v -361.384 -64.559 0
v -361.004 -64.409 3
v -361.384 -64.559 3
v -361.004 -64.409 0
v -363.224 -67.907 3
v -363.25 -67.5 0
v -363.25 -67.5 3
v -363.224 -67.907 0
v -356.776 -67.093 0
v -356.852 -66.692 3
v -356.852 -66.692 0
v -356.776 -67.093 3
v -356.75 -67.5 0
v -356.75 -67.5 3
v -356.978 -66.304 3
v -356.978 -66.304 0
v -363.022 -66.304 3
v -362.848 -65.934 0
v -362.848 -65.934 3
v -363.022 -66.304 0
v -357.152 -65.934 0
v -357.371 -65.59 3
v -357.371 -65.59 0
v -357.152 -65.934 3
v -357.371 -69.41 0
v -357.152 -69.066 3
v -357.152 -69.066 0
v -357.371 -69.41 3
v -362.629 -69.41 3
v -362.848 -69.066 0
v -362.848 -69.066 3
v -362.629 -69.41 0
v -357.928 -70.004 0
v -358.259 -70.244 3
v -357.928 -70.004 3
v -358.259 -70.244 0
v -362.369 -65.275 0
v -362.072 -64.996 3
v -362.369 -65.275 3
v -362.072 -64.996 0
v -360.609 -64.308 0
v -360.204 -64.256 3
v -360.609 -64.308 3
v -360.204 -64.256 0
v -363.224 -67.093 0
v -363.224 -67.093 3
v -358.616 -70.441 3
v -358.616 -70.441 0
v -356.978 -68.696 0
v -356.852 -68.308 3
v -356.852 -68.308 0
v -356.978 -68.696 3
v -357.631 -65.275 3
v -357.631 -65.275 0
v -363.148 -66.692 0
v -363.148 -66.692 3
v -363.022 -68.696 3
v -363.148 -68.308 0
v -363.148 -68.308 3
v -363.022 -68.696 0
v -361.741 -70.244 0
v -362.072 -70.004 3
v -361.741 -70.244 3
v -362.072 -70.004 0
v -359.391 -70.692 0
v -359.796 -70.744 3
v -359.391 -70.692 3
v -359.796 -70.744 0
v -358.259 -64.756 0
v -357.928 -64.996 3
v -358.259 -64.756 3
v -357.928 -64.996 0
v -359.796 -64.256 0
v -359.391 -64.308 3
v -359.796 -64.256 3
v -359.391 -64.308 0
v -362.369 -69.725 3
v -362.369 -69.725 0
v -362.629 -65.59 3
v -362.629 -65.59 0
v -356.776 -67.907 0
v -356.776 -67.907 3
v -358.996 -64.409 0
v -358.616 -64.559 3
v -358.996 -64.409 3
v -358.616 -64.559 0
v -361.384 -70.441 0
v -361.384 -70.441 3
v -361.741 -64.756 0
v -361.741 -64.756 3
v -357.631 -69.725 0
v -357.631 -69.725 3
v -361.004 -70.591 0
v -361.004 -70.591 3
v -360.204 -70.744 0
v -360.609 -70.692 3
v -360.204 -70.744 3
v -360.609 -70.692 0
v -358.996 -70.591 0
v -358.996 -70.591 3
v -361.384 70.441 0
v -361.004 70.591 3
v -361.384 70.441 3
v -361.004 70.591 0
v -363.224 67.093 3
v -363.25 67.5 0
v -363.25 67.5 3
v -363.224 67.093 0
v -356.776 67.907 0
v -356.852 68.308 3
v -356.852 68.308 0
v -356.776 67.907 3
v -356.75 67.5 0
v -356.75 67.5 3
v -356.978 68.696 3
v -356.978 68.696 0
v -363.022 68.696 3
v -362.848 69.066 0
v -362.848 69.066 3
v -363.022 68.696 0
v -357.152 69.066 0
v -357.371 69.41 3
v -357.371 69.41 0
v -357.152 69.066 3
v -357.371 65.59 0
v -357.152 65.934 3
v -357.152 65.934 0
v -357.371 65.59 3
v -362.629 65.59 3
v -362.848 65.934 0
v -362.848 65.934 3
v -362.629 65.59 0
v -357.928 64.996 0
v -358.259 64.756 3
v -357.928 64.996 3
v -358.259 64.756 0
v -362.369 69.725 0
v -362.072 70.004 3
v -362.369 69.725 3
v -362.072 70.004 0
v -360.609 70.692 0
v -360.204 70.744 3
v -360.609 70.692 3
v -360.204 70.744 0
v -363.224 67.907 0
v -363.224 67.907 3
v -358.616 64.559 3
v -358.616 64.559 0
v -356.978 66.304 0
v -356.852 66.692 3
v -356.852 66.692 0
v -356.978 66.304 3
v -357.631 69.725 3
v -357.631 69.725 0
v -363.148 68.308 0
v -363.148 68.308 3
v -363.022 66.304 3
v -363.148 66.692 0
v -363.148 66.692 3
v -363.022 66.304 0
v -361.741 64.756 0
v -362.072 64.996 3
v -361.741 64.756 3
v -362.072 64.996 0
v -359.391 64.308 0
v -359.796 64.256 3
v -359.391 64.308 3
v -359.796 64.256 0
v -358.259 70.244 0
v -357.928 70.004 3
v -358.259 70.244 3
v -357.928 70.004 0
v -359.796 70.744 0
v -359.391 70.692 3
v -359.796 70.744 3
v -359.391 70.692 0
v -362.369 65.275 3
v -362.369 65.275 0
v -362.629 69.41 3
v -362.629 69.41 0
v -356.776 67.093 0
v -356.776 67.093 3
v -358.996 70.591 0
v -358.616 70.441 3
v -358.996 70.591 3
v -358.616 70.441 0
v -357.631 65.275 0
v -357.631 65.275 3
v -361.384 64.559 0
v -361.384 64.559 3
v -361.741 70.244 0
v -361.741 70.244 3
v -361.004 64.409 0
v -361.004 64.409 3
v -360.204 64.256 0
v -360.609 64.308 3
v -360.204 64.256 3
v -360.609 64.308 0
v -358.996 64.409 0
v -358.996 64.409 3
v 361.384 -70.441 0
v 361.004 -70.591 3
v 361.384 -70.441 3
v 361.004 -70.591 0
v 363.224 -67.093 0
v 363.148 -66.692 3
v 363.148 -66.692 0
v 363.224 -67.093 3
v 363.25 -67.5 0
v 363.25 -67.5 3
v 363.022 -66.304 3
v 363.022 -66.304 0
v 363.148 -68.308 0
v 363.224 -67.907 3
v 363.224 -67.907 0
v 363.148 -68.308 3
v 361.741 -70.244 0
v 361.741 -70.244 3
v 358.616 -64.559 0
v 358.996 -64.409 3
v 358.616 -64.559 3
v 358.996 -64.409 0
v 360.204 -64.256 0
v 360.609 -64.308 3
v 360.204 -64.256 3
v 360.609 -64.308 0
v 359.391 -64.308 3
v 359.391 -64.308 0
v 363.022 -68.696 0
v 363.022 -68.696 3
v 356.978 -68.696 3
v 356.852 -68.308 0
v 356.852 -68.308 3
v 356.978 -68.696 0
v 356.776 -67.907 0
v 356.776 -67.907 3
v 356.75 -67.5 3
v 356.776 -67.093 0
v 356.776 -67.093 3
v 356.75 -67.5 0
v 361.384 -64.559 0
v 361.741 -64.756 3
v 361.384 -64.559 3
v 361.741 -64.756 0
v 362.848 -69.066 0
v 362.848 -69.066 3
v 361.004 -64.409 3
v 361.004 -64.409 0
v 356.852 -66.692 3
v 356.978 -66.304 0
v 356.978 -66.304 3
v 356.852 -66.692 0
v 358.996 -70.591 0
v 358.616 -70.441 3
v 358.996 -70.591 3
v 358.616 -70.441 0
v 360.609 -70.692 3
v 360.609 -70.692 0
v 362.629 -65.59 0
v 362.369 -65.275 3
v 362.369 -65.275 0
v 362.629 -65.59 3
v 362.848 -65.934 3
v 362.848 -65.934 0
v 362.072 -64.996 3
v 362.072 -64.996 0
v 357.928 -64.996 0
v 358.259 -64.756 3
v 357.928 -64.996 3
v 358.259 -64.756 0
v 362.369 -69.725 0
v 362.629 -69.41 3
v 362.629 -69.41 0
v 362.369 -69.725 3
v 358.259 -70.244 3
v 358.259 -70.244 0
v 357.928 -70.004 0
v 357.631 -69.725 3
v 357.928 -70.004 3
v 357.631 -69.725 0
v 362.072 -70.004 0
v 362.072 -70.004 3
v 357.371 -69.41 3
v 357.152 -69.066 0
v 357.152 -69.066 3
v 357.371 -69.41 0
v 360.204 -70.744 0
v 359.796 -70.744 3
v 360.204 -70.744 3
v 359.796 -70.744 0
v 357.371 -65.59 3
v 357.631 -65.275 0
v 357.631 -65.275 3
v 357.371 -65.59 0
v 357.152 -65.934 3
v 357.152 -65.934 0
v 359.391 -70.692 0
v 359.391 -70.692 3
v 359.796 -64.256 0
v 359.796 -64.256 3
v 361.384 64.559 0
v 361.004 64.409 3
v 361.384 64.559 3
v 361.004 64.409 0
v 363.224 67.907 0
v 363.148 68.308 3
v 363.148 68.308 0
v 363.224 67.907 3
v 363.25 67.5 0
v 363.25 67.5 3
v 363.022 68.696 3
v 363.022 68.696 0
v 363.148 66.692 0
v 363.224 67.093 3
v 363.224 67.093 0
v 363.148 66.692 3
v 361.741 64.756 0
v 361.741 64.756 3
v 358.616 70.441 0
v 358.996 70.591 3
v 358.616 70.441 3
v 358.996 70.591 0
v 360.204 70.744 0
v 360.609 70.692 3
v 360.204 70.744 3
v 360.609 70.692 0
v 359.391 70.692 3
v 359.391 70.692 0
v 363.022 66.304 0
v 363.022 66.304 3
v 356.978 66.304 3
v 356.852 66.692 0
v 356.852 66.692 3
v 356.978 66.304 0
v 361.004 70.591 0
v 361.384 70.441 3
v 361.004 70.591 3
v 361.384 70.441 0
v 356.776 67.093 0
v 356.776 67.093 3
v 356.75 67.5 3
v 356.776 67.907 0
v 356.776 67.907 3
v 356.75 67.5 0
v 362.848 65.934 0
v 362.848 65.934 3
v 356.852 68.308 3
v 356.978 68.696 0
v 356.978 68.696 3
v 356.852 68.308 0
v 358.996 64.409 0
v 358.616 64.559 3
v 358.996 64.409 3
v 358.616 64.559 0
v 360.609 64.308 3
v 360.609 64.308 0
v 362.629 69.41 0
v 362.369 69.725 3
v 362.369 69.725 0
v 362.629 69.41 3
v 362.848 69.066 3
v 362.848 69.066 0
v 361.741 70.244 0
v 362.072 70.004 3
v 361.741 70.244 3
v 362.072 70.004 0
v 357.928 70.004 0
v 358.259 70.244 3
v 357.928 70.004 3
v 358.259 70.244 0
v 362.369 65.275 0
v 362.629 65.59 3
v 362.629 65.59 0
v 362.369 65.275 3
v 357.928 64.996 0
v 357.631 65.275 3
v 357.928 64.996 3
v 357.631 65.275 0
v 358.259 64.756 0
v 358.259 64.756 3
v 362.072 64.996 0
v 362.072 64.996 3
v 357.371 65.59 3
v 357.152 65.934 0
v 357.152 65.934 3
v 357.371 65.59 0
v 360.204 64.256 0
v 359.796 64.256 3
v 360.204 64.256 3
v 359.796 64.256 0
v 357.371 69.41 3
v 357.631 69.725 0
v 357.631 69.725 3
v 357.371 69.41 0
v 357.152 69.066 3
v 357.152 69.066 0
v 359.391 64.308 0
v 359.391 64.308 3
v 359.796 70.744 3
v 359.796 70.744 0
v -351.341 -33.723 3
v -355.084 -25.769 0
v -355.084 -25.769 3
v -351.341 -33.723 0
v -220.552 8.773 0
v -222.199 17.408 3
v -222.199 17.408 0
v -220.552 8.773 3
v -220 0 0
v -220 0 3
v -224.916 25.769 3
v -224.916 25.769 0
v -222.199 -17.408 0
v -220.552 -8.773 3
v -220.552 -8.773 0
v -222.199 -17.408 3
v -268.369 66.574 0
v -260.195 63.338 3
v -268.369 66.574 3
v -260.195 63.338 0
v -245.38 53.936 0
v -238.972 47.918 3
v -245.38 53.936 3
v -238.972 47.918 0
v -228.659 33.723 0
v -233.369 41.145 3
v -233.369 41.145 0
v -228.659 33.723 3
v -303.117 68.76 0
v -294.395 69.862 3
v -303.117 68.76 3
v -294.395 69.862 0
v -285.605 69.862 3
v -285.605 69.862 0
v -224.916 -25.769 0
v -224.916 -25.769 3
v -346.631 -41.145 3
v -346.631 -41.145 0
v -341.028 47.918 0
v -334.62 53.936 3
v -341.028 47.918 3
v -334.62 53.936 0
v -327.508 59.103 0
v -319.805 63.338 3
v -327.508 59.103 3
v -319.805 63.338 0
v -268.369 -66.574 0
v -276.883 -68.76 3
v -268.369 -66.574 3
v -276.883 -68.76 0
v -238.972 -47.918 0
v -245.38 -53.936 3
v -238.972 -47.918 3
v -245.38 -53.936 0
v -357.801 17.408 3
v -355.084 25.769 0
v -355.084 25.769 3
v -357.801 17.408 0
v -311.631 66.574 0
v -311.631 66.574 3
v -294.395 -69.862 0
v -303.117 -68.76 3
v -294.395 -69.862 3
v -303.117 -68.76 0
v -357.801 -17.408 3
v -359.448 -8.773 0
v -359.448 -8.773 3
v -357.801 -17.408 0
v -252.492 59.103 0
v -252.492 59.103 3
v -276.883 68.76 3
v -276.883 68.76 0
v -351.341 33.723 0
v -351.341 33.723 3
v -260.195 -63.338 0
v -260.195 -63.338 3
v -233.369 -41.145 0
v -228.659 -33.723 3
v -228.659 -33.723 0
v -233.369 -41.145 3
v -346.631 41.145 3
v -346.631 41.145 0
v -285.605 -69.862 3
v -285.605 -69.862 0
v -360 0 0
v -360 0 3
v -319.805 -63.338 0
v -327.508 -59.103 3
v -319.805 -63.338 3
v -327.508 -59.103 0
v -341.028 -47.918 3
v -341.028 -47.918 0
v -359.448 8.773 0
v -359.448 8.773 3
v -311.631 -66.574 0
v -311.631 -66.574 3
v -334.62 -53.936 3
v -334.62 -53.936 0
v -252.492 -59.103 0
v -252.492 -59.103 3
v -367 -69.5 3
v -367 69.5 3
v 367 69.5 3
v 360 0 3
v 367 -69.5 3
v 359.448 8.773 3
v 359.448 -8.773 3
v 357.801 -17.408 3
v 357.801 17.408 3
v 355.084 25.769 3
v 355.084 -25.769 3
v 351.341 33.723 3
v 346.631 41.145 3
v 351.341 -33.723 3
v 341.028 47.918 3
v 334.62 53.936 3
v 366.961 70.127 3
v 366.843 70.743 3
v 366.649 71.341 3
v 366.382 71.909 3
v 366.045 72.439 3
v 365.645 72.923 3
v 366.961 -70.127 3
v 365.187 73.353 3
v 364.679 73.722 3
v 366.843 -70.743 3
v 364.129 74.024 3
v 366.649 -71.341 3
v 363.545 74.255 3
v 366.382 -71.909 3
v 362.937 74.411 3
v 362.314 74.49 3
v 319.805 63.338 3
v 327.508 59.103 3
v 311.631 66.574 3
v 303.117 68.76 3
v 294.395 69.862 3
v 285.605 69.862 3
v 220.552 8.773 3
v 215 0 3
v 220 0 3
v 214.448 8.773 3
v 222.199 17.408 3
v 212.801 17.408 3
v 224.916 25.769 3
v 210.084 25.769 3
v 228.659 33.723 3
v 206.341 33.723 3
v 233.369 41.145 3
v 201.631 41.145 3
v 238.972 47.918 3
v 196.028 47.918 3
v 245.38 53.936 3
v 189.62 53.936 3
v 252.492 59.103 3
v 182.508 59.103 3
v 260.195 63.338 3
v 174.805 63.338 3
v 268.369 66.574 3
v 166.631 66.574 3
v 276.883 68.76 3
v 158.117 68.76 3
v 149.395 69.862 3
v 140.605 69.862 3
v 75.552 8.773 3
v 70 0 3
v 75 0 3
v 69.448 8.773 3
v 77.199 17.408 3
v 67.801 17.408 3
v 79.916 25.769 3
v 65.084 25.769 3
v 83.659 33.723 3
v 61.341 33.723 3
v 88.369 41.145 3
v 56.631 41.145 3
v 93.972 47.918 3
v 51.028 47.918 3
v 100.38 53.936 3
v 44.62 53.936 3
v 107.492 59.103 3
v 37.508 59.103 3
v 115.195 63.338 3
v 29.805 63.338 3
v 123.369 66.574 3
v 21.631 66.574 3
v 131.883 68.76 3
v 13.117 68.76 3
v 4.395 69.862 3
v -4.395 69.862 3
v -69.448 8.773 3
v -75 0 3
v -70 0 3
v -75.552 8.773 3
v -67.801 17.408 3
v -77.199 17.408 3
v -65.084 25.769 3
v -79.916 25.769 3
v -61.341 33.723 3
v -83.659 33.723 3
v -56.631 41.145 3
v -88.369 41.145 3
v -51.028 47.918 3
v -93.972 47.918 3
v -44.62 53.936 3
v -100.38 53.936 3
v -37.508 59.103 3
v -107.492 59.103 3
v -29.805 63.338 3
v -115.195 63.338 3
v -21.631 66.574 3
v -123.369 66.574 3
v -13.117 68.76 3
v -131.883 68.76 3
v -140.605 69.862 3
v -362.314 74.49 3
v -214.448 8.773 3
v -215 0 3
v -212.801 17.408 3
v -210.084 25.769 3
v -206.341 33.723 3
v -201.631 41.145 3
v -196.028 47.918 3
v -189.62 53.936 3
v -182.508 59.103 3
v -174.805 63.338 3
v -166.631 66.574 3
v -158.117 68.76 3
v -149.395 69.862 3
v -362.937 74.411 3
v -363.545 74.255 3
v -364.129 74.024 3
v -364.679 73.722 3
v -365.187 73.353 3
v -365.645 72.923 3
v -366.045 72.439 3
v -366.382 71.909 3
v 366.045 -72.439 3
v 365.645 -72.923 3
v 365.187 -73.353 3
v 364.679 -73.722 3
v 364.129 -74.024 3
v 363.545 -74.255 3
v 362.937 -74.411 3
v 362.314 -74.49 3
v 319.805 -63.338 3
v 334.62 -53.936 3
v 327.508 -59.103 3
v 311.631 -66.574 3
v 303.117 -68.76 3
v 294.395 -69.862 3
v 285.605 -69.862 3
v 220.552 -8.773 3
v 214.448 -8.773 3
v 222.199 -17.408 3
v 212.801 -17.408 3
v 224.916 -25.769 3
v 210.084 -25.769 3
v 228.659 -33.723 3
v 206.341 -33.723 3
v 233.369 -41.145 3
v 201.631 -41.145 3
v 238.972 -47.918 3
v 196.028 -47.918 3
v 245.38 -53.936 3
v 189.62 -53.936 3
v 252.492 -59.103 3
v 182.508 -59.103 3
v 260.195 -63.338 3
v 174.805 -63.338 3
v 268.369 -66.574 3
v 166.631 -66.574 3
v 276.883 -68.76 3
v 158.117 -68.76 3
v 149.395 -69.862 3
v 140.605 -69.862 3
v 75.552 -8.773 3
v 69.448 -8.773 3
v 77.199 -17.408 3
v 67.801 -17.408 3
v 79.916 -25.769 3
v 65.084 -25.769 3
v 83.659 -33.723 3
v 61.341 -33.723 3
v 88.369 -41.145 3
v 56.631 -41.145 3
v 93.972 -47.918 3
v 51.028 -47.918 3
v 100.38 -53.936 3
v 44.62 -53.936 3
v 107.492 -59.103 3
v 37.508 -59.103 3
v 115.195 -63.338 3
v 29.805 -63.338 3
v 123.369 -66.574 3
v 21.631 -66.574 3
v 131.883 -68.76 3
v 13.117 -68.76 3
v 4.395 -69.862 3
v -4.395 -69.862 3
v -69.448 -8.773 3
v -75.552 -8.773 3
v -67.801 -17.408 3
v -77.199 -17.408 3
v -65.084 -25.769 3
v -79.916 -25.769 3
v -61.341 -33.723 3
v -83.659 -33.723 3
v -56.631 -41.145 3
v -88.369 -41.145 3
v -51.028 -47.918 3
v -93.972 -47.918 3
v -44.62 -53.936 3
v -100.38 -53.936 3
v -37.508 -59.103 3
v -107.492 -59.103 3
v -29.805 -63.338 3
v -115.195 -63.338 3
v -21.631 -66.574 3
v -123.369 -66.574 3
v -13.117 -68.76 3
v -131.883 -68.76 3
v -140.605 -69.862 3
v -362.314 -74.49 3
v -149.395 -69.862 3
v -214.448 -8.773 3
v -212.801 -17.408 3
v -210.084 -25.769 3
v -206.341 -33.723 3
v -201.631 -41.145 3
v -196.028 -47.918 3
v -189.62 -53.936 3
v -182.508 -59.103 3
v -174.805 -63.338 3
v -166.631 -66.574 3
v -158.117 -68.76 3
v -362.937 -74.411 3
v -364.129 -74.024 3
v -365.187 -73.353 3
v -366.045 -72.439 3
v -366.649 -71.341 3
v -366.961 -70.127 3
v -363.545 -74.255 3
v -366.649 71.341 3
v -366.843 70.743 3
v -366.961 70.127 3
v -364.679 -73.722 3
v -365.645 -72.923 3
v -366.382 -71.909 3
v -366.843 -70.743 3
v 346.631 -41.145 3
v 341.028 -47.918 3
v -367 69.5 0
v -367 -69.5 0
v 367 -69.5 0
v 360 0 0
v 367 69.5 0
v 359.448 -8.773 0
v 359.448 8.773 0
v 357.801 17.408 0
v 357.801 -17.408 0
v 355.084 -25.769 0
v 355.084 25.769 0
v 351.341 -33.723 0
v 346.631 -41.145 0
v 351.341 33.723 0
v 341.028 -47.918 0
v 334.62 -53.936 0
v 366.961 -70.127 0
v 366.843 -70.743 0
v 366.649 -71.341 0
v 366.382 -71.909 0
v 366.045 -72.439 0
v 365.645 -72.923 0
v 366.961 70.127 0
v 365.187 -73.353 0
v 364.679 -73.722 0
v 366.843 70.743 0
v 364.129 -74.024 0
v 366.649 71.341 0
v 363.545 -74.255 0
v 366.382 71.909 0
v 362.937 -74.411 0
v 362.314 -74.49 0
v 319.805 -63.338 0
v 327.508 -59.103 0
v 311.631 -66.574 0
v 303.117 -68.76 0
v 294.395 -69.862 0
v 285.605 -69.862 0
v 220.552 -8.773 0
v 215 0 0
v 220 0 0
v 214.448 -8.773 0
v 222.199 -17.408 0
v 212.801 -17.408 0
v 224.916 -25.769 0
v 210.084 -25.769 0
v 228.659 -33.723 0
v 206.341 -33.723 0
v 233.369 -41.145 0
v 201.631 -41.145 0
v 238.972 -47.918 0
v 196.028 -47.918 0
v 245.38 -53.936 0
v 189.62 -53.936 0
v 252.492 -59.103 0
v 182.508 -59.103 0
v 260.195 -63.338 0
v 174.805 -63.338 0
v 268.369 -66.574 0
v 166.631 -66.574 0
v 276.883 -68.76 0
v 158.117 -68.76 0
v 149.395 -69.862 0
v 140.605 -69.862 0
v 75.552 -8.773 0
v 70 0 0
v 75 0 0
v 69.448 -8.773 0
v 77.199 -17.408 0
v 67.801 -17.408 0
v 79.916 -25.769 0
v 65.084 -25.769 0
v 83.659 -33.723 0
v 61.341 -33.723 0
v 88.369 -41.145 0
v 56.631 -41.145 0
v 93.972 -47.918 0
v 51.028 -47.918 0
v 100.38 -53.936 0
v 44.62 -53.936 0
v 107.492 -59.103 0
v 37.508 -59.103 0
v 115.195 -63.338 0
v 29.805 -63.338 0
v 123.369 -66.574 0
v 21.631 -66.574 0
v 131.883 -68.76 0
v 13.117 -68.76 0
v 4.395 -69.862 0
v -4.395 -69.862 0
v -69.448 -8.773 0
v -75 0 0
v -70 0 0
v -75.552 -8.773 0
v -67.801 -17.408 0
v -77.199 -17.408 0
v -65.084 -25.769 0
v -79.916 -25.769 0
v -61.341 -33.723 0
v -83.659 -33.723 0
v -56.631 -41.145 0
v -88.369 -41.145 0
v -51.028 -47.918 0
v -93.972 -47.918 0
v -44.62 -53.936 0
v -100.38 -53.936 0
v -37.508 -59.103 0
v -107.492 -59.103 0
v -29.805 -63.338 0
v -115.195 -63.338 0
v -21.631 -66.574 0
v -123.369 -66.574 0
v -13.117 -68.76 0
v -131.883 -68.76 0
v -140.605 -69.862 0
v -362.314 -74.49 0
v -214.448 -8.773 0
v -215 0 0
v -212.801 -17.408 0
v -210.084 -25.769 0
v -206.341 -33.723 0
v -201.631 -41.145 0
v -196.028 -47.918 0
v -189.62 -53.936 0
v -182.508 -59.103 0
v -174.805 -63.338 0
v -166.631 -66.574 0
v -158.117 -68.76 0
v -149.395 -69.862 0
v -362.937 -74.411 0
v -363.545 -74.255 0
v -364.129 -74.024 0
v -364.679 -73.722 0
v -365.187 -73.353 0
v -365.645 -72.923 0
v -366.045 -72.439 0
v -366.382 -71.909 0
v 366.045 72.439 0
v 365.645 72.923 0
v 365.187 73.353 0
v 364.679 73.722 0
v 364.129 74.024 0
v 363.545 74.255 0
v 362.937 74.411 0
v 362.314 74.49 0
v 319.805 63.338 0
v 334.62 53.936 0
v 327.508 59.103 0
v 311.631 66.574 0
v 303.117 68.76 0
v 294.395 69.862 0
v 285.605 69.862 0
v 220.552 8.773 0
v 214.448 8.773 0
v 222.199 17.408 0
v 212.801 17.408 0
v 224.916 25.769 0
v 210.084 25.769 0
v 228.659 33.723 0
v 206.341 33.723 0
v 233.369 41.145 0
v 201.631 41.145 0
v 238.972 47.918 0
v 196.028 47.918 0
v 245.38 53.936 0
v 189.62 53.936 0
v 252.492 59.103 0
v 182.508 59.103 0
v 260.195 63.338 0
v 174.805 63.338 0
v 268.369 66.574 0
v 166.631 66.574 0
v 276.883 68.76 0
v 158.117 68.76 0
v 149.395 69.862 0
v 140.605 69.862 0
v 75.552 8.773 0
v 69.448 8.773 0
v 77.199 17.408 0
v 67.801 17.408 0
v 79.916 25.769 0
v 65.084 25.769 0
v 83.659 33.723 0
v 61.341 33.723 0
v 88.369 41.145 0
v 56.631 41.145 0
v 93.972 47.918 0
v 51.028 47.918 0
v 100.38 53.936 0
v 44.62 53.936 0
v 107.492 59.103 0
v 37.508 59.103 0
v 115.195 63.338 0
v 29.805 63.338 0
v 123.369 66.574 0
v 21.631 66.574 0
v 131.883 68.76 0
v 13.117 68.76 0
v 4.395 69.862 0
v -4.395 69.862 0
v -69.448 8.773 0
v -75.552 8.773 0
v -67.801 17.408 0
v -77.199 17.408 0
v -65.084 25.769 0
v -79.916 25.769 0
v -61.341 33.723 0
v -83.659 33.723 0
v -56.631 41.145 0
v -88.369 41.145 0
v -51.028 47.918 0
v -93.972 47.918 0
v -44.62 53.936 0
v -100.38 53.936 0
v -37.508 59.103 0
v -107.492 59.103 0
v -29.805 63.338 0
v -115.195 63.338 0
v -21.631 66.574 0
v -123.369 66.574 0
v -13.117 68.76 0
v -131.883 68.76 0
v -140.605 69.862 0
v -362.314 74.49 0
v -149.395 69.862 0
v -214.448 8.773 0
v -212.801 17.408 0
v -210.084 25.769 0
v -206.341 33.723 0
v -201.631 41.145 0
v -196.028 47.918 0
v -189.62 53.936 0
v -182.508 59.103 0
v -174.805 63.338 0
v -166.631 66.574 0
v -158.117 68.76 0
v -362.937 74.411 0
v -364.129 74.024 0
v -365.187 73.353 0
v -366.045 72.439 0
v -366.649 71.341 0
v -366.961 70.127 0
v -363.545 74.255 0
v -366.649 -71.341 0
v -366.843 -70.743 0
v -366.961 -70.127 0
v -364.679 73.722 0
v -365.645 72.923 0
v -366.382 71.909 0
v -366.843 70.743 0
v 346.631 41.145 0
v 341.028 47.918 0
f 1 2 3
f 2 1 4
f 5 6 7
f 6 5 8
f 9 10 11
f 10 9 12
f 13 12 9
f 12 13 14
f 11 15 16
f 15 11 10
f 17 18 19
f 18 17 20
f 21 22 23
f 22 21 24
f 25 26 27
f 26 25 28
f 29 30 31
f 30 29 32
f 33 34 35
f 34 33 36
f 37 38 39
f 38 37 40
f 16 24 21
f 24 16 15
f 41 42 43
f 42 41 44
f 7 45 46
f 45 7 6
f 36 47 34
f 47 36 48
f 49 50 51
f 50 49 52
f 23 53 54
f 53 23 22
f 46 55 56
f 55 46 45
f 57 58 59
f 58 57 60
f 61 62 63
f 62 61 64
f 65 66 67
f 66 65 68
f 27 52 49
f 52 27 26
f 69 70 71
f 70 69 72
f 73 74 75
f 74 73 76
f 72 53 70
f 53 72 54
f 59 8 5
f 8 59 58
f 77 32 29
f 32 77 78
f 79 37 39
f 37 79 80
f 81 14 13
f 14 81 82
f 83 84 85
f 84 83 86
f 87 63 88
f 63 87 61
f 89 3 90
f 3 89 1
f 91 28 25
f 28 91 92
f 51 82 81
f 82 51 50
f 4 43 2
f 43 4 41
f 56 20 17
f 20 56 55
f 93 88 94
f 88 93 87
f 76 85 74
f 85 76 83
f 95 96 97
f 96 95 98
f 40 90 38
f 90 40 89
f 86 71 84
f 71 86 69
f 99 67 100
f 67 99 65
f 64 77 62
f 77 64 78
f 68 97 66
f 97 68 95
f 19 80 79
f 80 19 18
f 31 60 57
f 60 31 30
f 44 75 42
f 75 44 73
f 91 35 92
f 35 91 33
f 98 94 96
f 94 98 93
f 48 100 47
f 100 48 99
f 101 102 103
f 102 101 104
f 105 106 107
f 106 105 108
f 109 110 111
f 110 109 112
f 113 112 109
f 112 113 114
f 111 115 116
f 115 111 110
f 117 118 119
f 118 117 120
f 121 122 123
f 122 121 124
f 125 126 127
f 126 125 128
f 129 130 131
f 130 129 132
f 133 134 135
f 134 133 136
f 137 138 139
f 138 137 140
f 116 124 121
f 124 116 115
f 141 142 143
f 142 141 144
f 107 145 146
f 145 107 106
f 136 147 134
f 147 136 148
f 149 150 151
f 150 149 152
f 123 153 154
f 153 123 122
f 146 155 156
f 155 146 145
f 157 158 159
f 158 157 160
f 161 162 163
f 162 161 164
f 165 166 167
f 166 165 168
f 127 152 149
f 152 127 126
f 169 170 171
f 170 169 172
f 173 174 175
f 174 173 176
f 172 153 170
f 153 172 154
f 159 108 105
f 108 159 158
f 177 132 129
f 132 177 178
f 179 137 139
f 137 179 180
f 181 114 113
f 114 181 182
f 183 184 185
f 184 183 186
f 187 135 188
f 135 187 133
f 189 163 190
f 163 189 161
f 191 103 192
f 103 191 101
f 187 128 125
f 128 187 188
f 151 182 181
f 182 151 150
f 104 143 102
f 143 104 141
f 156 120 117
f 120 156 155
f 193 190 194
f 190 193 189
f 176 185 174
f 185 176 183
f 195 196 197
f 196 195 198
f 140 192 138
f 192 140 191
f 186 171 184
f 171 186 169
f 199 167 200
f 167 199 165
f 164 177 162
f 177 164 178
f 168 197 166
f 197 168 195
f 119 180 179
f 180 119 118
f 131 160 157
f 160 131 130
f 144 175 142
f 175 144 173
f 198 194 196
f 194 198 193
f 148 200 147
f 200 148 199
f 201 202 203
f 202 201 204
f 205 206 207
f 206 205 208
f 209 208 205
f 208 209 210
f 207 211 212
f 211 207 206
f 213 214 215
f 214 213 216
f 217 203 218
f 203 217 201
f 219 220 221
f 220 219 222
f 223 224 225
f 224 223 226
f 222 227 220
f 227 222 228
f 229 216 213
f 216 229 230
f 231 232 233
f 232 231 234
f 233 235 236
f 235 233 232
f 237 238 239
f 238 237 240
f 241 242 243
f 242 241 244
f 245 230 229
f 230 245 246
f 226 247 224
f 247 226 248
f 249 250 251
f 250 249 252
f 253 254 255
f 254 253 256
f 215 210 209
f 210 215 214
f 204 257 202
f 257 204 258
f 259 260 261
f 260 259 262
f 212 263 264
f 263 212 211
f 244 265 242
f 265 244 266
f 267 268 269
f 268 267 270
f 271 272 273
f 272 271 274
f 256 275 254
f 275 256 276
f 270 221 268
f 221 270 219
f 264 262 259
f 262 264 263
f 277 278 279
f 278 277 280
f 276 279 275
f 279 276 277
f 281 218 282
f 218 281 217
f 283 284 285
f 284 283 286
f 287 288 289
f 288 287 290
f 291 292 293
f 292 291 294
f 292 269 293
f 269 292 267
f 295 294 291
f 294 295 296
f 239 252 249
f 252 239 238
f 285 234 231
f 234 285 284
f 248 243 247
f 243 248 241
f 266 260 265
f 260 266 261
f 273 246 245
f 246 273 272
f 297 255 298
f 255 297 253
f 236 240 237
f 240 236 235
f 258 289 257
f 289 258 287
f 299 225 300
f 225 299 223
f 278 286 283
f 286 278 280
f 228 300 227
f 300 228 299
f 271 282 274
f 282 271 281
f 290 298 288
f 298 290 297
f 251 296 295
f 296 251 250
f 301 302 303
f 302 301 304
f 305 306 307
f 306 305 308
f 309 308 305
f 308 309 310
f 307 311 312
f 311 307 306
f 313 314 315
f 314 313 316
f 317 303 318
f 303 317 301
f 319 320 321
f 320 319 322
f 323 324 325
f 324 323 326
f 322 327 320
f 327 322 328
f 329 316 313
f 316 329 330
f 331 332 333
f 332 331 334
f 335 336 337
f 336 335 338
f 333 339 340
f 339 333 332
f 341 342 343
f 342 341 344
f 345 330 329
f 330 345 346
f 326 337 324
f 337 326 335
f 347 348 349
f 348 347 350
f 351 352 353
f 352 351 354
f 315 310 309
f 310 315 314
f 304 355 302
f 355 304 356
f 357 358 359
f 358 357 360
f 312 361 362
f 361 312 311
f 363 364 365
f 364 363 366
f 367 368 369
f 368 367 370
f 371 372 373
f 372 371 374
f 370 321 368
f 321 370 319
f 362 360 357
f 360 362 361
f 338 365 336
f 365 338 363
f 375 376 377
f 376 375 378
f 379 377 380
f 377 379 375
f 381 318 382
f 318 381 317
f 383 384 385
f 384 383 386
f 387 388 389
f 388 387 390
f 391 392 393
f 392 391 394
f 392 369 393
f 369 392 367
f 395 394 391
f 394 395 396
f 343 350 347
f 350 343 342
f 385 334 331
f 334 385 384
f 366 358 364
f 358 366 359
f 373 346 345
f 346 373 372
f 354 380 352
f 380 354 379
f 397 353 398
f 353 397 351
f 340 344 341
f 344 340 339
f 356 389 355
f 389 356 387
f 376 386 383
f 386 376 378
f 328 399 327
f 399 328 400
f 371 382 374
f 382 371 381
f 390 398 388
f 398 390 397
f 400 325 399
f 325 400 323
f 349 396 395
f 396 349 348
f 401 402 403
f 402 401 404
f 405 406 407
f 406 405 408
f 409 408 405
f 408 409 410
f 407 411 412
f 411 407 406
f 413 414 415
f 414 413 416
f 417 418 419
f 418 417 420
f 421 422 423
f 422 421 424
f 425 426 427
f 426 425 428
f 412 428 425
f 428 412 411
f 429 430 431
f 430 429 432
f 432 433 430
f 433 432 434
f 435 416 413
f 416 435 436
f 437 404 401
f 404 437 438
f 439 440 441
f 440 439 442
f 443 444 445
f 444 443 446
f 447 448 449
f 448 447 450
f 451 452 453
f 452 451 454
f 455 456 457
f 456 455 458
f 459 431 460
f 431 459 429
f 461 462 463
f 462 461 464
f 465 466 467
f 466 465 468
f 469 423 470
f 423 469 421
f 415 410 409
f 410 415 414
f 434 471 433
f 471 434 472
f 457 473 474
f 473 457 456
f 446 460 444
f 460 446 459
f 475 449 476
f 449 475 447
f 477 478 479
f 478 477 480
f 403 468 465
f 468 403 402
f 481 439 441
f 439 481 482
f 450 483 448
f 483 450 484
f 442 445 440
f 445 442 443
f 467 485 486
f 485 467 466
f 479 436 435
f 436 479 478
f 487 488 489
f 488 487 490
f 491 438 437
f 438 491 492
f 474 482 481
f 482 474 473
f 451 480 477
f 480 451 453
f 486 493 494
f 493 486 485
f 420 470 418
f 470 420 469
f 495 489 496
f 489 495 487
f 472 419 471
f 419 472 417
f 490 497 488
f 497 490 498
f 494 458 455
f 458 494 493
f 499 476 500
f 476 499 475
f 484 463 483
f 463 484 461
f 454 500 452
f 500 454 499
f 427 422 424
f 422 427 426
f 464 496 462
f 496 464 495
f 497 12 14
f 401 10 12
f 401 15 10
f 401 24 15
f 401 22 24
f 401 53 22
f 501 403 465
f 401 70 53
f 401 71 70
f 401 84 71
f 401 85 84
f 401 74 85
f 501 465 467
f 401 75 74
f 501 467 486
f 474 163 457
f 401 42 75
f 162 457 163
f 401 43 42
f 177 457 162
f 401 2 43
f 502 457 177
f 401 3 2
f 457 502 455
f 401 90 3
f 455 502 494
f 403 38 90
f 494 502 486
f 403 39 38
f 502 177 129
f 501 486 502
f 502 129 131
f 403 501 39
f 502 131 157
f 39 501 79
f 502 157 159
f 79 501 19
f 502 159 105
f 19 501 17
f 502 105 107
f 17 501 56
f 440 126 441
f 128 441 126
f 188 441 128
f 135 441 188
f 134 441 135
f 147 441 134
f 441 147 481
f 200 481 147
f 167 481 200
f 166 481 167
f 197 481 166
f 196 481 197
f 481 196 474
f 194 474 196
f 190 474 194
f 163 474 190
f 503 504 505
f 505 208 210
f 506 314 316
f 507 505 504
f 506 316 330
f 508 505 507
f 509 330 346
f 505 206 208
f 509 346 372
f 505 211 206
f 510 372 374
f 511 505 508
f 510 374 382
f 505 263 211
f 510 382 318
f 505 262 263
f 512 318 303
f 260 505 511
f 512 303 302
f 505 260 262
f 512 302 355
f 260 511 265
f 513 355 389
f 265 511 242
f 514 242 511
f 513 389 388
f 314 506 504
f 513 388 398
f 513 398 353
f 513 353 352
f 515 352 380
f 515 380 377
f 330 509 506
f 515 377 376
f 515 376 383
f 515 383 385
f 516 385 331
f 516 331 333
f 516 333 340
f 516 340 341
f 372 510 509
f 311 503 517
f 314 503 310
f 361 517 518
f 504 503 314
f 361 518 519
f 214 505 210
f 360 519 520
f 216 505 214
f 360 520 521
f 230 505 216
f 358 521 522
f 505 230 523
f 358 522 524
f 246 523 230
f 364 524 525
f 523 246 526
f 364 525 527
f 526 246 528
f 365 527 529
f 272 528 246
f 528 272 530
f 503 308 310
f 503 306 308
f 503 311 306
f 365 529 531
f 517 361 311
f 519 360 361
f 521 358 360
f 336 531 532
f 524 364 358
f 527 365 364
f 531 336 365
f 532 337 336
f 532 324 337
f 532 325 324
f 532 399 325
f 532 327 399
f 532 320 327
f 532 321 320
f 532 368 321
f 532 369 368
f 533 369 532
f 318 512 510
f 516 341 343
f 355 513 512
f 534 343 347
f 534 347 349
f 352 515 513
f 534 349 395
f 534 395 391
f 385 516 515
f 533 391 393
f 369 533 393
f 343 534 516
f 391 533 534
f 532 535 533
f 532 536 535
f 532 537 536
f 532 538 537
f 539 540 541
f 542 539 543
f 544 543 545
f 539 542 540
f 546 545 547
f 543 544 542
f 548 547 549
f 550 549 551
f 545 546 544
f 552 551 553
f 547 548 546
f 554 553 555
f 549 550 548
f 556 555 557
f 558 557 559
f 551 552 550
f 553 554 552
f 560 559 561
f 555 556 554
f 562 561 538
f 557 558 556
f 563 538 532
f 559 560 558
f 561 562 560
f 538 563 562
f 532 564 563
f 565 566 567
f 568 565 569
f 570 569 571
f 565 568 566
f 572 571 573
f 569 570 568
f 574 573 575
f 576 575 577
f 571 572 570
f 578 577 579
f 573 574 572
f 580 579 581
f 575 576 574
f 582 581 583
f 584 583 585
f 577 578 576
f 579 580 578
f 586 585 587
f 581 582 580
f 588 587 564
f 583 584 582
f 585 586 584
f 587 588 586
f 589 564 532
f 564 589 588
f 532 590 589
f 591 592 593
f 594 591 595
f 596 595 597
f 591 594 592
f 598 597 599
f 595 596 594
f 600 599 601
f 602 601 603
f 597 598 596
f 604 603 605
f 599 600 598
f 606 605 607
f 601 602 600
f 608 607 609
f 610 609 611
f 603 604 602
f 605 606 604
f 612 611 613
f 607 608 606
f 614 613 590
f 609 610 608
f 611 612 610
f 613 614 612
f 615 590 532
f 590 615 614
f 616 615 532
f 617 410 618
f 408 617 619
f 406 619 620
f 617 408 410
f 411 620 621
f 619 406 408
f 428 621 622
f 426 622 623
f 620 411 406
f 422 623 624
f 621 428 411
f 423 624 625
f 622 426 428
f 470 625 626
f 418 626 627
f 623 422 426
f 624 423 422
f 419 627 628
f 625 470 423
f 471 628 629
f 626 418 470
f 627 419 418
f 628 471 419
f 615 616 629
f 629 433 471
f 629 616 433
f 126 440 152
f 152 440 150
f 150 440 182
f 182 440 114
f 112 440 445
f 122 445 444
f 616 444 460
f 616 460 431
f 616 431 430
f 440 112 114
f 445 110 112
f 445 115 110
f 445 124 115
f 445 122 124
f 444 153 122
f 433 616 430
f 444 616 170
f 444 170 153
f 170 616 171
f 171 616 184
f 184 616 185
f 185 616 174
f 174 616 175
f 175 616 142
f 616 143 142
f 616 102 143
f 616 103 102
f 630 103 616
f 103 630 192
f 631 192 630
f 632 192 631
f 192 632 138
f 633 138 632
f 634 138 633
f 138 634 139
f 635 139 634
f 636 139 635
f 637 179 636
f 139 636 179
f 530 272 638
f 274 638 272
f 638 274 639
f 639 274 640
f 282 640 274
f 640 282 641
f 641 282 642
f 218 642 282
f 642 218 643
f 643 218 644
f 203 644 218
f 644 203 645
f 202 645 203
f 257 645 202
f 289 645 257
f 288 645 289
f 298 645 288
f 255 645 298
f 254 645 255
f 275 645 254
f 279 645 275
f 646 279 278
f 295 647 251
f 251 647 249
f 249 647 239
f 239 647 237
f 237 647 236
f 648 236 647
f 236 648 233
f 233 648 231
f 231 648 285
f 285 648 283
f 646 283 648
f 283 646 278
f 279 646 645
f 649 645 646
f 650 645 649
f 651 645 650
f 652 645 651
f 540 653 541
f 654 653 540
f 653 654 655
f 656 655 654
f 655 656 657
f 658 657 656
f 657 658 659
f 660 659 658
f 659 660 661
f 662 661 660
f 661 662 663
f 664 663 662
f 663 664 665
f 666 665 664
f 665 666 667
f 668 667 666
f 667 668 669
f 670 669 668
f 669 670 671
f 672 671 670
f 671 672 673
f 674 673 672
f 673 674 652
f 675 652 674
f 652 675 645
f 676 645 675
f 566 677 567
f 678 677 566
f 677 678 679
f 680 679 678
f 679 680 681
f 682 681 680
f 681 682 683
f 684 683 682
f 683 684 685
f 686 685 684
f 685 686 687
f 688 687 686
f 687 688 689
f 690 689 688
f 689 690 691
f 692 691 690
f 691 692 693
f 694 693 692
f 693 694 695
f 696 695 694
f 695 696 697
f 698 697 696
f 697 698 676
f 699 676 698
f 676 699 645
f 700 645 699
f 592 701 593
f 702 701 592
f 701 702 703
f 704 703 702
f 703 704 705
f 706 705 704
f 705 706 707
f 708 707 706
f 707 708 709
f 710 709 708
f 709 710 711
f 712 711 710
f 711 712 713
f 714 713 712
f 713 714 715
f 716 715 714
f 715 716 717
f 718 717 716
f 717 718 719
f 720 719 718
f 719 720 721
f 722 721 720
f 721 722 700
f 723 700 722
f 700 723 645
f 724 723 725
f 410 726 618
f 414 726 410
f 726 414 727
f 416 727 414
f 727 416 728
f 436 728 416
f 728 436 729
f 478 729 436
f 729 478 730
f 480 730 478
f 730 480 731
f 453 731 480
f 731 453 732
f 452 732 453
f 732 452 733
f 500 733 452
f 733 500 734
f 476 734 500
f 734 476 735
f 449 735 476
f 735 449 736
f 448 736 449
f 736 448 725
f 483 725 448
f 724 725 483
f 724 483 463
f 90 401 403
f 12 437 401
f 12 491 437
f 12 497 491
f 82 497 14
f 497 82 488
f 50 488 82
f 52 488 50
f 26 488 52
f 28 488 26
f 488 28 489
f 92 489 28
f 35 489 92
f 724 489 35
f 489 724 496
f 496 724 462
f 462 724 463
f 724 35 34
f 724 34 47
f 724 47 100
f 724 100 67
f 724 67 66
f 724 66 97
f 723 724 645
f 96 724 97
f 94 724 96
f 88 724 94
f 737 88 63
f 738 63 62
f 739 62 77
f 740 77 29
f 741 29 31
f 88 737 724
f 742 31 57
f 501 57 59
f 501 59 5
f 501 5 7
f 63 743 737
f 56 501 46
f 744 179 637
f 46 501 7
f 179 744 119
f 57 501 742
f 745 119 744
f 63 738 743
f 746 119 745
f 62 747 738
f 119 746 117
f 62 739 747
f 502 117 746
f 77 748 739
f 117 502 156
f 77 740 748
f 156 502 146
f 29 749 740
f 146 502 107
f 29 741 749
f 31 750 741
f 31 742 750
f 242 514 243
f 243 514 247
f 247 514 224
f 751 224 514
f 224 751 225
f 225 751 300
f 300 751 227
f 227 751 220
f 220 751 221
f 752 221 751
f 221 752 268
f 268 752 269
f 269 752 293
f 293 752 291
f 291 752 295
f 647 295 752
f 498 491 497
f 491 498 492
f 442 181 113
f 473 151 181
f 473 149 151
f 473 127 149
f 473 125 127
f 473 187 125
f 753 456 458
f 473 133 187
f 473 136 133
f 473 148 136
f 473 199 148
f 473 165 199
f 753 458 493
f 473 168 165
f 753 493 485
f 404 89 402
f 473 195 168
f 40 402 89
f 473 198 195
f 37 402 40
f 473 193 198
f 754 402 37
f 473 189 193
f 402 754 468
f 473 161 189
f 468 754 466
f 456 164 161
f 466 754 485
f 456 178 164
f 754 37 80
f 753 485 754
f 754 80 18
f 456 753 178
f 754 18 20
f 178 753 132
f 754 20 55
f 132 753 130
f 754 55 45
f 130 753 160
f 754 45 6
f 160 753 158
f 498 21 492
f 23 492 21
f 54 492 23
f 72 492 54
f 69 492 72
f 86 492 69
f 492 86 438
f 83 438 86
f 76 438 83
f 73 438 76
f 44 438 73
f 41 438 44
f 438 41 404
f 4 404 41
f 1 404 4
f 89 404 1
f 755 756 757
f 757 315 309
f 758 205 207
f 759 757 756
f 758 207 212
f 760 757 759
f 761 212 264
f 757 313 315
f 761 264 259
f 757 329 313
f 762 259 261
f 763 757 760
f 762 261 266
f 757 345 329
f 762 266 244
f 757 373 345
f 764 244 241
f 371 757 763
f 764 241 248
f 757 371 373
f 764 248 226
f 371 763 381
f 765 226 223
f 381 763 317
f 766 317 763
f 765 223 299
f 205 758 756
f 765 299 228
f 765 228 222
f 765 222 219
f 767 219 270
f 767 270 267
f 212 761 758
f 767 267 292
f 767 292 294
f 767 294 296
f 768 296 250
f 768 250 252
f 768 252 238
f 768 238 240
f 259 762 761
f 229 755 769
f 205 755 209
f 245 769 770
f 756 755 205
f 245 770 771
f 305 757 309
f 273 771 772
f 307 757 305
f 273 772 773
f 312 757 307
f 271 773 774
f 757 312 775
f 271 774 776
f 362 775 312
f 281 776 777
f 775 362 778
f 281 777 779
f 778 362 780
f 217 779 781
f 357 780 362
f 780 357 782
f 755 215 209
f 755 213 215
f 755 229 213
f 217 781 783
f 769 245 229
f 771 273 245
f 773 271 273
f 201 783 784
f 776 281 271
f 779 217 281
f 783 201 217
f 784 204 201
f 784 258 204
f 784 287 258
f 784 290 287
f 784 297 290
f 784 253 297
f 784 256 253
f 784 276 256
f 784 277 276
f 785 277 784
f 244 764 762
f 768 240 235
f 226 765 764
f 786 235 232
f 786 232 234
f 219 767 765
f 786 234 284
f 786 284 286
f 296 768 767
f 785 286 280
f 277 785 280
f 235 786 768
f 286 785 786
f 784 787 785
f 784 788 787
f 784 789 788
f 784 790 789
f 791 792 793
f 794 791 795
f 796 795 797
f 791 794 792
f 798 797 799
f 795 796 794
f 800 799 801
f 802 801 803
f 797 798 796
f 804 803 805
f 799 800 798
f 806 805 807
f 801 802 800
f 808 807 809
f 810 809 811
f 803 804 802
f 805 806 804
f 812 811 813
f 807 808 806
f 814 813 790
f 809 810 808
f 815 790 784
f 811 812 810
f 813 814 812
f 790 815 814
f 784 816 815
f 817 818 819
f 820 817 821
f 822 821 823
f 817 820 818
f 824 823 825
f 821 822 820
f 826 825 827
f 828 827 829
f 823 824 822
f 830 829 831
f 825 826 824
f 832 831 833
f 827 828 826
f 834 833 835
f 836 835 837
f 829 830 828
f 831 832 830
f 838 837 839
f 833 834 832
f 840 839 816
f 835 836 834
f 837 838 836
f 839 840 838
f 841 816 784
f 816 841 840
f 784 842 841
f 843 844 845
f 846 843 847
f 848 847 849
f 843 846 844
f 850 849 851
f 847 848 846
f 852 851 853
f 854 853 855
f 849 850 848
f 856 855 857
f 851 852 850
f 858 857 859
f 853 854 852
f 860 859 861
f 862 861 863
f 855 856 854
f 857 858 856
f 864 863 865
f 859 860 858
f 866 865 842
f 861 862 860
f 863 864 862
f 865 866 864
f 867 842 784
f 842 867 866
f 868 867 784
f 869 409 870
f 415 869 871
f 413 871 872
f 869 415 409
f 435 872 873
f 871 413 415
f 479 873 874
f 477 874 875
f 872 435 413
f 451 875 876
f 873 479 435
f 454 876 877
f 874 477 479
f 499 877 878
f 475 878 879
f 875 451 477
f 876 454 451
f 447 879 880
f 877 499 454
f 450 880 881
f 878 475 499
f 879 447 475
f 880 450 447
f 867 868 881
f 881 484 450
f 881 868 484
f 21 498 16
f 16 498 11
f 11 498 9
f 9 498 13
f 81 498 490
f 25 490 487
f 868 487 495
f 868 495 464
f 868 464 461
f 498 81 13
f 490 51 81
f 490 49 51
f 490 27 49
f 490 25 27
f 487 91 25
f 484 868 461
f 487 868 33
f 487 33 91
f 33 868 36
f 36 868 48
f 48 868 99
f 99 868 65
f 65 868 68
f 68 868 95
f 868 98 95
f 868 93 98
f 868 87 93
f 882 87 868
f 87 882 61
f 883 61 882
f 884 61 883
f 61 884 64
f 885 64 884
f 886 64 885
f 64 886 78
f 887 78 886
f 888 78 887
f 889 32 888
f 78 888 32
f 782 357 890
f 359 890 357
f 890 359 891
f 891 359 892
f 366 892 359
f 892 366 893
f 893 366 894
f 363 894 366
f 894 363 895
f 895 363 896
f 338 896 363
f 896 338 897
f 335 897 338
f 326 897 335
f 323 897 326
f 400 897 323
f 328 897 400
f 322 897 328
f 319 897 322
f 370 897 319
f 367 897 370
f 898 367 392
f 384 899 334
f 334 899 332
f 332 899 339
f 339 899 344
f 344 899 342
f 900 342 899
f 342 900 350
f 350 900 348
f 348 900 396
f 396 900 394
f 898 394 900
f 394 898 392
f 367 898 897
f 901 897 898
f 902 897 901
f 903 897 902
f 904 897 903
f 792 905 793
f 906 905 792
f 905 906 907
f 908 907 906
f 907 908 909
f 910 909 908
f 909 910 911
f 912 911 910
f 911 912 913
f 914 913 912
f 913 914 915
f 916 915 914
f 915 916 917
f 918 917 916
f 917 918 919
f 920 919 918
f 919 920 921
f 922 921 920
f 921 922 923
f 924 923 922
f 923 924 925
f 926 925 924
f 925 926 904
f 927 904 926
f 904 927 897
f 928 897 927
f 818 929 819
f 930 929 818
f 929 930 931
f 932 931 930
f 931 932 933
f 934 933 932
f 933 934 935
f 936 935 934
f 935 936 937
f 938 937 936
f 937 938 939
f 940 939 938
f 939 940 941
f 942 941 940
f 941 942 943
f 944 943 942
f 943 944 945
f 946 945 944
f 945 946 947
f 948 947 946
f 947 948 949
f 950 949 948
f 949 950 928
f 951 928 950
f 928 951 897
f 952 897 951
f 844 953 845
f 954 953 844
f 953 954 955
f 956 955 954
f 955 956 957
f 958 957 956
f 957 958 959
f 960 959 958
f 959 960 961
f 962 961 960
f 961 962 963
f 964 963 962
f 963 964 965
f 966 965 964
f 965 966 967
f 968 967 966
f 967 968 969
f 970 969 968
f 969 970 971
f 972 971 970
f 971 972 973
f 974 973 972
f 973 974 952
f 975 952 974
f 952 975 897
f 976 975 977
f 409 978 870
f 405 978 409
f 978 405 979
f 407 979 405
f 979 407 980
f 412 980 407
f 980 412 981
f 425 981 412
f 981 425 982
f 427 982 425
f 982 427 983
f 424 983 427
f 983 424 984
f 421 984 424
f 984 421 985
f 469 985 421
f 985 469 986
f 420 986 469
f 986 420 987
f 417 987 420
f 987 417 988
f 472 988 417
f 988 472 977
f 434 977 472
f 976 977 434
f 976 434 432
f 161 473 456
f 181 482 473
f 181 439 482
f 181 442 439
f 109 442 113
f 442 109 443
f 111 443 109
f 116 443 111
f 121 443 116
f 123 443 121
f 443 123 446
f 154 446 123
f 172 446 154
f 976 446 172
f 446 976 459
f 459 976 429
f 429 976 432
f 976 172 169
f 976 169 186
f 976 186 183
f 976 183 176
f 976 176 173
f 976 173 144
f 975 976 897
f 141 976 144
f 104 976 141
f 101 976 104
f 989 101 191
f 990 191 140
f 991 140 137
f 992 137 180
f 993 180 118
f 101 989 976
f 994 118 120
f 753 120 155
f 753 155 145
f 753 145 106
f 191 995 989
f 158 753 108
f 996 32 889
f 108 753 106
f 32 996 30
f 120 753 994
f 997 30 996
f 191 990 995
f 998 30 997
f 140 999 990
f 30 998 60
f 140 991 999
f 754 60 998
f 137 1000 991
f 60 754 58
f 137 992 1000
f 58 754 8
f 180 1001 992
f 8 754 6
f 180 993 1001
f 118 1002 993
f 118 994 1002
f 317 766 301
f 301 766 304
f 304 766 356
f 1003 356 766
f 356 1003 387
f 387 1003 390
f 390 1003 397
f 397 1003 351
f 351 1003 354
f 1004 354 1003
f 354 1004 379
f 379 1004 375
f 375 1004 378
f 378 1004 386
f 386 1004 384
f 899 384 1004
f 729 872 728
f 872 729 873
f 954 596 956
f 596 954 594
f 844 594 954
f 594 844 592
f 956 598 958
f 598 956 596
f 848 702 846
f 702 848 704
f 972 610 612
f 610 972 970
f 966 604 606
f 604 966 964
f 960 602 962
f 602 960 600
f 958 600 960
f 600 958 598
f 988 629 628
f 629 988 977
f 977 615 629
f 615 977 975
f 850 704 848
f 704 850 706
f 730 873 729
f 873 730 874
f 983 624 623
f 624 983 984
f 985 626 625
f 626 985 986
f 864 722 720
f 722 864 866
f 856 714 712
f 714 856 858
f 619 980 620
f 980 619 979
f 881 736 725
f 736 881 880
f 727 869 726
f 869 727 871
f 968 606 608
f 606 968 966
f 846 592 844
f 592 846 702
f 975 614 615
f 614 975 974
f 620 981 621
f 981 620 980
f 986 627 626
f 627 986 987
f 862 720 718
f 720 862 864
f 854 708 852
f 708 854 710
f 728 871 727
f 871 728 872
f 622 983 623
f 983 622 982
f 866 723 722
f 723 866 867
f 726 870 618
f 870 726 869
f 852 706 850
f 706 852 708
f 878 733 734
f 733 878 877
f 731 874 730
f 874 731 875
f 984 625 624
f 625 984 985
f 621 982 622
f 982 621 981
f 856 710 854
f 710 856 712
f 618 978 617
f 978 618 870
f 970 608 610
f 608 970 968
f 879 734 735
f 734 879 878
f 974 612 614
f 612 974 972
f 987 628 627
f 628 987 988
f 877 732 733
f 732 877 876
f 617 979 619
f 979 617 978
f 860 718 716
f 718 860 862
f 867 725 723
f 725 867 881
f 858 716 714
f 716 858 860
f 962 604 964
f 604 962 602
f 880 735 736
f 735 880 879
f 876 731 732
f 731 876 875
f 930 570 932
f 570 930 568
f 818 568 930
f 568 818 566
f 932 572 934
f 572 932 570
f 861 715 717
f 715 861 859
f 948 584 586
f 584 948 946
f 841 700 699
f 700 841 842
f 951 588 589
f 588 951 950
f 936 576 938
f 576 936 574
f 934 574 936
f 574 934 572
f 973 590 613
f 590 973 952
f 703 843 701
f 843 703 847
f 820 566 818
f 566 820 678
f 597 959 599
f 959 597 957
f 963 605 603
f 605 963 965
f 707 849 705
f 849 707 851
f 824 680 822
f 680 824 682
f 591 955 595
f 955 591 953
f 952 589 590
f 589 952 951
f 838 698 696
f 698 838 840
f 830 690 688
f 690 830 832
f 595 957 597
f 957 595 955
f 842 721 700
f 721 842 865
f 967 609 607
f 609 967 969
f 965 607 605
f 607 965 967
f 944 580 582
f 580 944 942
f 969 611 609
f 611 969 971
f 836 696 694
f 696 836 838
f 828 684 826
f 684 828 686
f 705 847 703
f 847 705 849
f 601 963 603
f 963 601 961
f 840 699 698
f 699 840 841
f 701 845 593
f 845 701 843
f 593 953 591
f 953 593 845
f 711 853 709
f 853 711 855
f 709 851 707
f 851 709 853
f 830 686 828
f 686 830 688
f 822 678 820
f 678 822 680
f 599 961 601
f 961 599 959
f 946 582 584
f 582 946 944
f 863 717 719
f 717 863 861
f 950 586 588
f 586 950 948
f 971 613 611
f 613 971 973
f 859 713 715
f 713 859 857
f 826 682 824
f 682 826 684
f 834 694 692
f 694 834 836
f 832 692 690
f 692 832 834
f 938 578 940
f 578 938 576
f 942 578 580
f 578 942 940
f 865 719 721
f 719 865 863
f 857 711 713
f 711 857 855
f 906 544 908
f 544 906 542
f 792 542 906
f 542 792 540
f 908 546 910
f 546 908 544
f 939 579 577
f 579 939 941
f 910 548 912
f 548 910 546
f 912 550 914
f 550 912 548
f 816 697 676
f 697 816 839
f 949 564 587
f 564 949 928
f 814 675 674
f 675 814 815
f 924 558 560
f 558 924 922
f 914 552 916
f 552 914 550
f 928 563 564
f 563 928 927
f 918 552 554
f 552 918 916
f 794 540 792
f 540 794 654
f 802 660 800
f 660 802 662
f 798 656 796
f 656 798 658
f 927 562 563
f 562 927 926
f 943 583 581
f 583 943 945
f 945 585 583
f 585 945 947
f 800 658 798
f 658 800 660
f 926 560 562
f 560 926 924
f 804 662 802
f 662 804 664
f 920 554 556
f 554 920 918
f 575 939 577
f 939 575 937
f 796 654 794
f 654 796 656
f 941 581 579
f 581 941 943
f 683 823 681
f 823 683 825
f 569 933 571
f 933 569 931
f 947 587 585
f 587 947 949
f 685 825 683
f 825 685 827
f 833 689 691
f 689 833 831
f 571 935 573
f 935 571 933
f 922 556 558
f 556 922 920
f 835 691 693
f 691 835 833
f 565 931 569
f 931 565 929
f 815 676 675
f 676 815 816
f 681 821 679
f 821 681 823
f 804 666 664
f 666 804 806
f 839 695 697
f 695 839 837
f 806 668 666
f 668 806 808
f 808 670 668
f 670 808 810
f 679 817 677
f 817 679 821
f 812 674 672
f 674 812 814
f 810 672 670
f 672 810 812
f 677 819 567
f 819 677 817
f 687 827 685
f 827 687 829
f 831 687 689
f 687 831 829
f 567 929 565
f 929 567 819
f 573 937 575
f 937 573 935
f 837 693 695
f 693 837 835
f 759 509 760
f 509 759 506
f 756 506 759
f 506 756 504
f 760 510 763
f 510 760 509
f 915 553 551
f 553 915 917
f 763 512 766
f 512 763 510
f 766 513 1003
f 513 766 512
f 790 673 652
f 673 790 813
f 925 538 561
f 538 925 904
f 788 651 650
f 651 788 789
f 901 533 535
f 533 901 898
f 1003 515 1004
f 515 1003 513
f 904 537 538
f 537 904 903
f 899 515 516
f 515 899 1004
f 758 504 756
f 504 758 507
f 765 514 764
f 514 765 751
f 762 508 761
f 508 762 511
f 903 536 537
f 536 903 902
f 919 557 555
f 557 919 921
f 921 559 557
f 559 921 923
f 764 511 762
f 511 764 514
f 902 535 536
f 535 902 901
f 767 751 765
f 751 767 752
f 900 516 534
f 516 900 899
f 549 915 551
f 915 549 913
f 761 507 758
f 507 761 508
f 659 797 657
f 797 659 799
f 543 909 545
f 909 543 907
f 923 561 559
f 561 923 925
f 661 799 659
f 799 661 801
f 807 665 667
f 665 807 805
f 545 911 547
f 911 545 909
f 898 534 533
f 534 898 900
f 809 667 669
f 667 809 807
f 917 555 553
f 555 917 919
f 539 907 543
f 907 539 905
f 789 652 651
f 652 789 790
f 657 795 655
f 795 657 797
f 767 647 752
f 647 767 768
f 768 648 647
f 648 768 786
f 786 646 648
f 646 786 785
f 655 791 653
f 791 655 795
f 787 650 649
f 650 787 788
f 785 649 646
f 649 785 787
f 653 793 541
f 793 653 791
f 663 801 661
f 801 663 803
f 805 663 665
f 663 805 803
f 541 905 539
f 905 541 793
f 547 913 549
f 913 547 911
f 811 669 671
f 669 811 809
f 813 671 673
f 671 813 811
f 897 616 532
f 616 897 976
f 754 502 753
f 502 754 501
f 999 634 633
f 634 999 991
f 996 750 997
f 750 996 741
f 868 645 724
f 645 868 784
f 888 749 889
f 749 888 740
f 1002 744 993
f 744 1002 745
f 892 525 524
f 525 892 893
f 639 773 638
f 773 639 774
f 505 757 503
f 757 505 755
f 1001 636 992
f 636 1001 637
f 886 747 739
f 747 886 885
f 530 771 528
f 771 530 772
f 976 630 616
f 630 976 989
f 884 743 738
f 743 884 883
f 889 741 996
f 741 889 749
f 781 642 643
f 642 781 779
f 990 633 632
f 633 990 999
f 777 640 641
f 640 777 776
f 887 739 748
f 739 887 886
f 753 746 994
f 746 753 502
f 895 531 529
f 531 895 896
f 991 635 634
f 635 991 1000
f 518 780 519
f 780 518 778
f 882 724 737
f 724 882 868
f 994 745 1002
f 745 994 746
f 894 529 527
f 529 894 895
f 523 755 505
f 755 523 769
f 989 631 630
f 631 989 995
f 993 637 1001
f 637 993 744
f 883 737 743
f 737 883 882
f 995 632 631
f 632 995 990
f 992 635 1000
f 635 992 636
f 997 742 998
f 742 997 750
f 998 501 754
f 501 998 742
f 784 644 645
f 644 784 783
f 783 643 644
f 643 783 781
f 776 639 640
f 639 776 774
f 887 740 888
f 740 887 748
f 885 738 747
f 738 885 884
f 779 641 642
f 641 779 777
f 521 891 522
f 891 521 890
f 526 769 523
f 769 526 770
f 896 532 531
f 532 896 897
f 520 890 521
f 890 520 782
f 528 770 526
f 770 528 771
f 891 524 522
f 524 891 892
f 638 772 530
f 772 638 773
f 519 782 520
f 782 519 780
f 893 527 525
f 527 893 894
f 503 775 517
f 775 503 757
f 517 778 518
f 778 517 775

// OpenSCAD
$fn = 50;


difference() {
	union() {
		hull() {
			translate(v = [-362.0000000000, 69.5000000000, 0]) {
				cylinder(h = 3, r = 5);
			}
			translate(v = [362.0000000000, 69.5000000000, 0]) {
				cylinder(h = 3, r = 5);
			}
			translate(v = [-362.0000000000, -69.5000000000, 0]) {
				cylinder(h = 3, r = 5);
			}
			translate(v = [362.0000000000, -69.5000000000, 0]) {
				cylinder(h = 3, r = 5);
			}
		}
	}
	union() {
		#translate(v = [-360.0000000000, -67.5000000000, -100.0000000000]) {
			cylinder(h = 200, r = 3.2500000000);
		}
		#translate(v = [-360.0000000000, 67.5000000000, -100.0000000000]) {
			cylinder(h = 200, r = 3.2500000000);
		}
		#translate(v = [360.0000000000, -67.5000000000, -100.0000000000]) {
			cylinder(h = 200, r = 3.2500000000);
		}
		#translate(v = [360.0000000000, 67.5000000000, -100.0000000000]) {
			cylinder(h = 200, r = 3.2500000000);
		}
		#translate(v = [-290.0000000000, 0, 0]) {
			cylinder(h = 3, r = 70.0000000000);
		}
		#translate(v = [-145.0000000000, 0, 0]) {
			cylinder(h = 3, r = 70.0000000000);
		}
		#cylinder(h = 3, r = 70.0000000000);
		#translate(v = [145.0000000000, 0, 0]) {
			cylinder(h = 3, r = 70.0000000000);
		}
		#translate(v = [290.0000000000, 0, 0]) {
			cylinder(h = 3, r = 70.0000000000);
		}
	}
}
